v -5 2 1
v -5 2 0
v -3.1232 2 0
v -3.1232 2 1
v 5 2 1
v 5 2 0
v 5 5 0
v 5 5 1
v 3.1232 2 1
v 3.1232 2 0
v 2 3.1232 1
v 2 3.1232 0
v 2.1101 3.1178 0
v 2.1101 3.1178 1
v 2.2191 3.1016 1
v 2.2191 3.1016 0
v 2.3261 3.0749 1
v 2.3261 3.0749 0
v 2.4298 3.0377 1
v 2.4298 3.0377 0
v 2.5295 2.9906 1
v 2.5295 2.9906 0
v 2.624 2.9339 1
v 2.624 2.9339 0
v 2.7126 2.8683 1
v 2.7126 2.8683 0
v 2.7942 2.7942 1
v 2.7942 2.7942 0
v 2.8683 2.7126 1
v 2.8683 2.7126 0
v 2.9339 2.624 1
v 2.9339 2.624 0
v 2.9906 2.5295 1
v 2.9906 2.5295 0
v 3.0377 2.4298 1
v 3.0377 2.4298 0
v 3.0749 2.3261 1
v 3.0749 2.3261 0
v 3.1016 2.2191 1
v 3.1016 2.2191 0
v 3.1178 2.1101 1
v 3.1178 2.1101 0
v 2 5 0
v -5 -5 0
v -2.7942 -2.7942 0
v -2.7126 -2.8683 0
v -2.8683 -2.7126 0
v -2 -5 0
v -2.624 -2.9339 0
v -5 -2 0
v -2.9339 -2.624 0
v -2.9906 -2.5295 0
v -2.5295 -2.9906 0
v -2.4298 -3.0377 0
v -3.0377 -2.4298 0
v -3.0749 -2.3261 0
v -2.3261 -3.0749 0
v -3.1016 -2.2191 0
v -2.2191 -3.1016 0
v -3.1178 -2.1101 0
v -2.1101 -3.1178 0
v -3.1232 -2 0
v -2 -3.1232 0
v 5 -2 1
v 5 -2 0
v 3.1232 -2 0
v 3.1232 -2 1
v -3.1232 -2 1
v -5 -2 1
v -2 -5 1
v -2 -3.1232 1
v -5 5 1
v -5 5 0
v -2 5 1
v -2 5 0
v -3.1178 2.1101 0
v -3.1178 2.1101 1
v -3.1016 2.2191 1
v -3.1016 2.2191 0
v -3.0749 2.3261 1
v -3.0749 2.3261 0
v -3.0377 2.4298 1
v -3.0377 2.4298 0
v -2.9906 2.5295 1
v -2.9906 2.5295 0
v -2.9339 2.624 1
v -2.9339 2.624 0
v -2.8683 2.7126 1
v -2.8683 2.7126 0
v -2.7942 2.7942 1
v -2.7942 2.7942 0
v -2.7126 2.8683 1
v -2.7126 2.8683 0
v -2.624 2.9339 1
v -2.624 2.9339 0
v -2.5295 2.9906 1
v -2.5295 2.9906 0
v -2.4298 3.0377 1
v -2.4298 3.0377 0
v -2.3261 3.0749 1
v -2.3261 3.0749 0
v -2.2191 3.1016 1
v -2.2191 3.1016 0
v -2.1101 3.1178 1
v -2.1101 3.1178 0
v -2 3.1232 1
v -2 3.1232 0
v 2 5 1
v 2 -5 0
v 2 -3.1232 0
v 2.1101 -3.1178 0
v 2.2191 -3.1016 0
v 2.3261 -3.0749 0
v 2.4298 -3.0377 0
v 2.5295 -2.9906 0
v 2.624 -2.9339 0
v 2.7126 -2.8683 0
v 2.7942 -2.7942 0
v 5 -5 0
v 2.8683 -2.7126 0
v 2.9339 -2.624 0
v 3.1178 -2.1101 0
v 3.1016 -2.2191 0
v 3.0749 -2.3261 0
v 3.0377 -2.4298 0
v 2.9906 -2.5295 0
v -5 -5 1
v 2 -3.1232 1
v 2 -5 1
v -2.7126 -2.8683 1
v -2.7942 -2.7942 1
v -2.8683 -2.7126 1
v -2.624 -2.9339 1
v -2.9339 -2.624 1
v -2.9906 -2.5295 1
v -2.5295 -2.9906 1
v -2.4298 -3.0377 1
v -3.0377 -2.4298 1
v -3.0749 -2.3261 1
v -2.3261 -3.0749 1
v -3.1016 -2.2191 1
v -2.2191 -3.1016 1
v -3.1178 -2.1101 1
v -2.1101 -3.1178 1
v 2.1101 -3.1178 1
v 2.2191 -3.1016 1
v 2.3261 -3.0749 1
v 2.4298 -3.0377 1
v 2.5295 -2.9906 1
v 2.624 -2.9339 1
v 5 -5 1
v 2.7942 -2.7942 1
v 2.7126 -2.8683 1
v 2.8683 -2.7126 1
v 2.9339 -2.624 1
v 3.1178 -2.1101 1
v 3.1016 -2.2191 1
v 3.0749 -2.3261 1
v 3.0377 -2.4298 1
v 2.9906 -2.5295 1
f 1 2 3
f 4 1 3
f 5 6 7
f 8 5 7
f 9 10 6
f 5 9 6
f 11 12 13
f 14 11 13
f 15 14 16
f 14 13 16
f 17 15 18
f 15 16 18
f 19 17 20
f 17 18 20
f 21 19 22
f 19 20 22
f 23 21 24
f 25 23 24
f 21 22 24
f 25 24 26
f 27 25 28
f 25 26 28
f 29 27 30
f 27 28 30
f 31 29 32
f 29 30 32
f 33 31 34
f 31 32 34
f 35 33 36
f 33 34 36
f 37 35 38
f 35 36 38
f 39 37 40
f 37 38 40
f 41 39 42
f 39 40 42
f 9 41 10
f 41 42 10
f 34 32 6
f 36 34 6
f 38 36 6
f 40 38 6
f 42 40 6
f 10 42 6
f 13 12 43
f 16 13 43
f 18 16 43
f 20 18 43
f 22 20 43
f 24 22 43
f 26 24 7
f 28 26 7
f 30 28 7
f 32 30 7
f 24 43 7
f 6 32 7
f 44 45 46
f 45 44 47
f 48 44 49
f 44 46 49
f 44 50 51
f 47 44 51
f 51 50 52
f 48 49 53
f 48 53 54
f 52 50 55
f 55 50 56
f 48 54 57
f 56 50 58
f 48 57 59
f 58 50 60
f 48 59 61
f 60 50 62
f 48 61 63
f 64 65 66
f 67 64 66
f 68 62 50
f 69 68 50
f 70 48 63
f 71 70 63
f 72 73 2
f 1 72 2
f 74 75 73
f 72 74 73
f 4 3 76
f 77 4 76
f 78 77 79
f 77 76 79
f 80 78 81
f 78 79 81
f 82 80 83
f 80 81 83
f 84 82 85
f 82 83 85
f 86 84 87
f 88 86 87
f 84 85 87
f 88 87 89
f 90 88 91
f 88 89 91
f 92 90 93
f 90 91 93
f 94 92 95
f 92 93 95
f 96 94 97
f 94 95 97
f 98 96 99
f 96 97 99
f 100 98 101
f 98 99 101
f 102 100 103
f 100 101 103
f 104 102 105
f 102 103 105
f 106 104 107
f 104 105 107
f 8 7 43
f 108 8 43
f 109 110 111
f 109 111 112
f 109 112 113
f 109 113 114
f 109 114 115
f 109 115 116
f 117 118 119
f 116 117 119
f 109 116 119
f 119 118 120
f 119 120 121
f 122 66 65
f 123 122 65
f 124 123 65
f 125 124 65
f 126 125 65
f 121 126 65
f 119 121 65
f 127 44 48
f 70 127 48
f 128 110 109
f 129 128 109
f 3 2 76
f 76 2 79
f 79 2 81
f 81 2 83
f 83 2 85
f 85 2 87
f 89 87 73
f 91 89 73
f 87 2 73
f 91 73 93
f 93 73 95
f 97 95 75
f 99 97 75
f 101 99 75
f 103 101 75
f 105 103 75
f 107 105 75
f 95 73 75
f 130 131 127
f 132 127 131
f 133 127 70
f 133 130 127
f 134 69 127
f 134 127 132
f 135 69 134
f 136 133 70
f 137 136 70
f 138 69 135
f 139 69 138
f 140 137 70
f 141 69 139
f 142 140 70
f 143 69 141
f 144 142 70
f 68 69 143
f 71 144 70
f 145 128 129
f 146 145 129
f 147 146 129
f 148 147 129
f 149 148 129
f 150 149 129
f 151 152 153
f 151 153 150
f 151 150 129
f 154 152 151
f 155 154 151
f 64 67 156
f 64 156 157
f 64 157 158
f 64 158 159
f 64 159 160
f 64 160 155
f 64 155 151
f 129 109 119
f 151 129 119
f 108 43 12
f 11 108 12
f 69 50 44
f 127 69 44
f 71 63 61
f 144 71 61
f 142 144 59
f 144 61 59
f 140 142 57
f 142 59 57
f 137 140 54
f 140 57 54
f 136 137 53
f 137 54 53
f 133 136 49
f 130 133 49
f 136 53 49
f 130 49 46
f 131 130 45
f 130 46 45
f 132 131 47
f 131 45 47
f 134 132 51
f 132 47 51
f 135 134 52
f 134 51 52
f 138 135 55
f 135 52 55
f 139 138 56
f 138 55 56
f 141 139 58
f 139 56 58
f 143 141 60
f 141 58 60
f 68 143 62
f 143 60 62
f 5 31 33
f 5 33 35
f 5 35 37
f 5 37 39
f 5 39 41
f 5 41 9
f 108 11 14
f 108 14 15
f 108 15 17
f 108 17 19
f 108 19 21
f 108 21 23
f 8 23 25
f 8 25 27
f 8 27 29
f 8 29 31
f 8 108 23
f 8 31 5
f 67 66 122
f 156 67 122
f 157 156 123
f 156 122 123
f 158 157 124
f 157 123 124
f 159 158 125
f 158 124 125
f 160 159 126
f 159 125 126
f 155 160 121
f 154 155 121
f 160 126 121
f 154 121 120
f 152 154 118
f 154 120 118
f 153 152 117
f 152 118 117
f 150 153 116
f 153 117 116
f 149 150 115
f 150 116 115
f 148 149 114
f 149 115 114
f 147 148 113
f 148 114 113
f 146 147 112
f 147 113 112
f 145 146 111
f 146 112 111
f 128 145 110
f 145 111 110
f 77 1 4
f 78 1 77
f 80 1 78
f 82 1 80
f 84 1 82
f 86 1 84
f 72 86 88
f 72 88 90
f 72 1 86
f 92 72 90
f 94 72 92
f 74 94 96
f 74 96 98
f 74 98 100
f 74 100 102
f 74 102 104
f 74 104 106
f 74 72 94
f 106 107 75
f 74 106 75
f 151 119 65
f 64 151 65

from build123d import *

# Parameters (mm, degrees)
BOSS_EXTRUDE1_DEPTH   = 1
BOSS_EXTRUDE1_2_DEPTH = 1
BOSS_EXTRUDE1_3_DEPTH = 1
BOSS_EXTRUDE1_4_DEPTH = 1


with BuildPart() as part:
    # Sketch1 → Boss-Extrude1 (new body)
    with BuildSketch(Plane.XY):
        with BuildLine():
            Line((2, -5), (5, -5))
            Line((5, -5), (5, -2))
            Line((5, -2), (3.123218099, -2))
            ThreePointArc((3.123218099, -2), (2.794235135, -2.794235135), (2, -3.123218099))
            Line((2, -3.123218099), (2, -5))
        make_face()
    extrude(amount=BOSS_EXTRUDE1_DEPTH)


with BuildPart() as body_2:
    # Sketch1 → Boss-Extrude1 2 (new body)
    with BuildSketch(Plane.XY):
        with BuildLine():
            Line((-5, -5), (-2, -5))
            Line((-2, -5), (-2, -3.123218099))
            ThreePointArc((-2, -3.123218099), (-2.794235135, -2.794235135), (-3.123218099, -2))
            Line((-3.123218099, -2), (-5, -2))
            Line((-5, -2), (-5, -5))
        make_face()
    extrude(amount=BOSS_EXTRUDE1_2_DEPTH)


with BuildPart() as body_3:
    # Sketch1 → Boss-Extrude1 3 (new body)
    with BuildSketch(Plane.XY):
        with BuildLine():
            Line((3.123218099, 2), (5, 2))
            Line((5, 2), (5, 5))
            Line((5, 5), (2, 5))
            Line((2, 5), (2, 3.123218099))
            ThreePointArc((2, 3.123218099), (2.794235135, 2.794235135), (3.123218099, 2))
        make_face()
    extrude(amount=BOSS_EXTRUDE1_3_DEPTH)


with BuildPart() as body_4:
    # Sketch1 → Boss-Extrude1 4 (new body)
    with BuildSketch(Plane.XY):
        with BuildLine():
            Line((-5, 5), (-5, 2))
            Line((-5, 2), (-3.123218099, 2))
            ThreePointArc((-3.123218099, 2), (-2.794235135, 2.794235135), (-2, 3.123218099))
            Line((-2, 3.123218099), (-2, 5))
            Line((-2, 5), (-5, 5))
        make_face()
    extrude(amount=BOSS_EXTRUDE1_4_DEPTH)


solid = Compound([part.part, body_2.part, body_3.part, body_4.part])
